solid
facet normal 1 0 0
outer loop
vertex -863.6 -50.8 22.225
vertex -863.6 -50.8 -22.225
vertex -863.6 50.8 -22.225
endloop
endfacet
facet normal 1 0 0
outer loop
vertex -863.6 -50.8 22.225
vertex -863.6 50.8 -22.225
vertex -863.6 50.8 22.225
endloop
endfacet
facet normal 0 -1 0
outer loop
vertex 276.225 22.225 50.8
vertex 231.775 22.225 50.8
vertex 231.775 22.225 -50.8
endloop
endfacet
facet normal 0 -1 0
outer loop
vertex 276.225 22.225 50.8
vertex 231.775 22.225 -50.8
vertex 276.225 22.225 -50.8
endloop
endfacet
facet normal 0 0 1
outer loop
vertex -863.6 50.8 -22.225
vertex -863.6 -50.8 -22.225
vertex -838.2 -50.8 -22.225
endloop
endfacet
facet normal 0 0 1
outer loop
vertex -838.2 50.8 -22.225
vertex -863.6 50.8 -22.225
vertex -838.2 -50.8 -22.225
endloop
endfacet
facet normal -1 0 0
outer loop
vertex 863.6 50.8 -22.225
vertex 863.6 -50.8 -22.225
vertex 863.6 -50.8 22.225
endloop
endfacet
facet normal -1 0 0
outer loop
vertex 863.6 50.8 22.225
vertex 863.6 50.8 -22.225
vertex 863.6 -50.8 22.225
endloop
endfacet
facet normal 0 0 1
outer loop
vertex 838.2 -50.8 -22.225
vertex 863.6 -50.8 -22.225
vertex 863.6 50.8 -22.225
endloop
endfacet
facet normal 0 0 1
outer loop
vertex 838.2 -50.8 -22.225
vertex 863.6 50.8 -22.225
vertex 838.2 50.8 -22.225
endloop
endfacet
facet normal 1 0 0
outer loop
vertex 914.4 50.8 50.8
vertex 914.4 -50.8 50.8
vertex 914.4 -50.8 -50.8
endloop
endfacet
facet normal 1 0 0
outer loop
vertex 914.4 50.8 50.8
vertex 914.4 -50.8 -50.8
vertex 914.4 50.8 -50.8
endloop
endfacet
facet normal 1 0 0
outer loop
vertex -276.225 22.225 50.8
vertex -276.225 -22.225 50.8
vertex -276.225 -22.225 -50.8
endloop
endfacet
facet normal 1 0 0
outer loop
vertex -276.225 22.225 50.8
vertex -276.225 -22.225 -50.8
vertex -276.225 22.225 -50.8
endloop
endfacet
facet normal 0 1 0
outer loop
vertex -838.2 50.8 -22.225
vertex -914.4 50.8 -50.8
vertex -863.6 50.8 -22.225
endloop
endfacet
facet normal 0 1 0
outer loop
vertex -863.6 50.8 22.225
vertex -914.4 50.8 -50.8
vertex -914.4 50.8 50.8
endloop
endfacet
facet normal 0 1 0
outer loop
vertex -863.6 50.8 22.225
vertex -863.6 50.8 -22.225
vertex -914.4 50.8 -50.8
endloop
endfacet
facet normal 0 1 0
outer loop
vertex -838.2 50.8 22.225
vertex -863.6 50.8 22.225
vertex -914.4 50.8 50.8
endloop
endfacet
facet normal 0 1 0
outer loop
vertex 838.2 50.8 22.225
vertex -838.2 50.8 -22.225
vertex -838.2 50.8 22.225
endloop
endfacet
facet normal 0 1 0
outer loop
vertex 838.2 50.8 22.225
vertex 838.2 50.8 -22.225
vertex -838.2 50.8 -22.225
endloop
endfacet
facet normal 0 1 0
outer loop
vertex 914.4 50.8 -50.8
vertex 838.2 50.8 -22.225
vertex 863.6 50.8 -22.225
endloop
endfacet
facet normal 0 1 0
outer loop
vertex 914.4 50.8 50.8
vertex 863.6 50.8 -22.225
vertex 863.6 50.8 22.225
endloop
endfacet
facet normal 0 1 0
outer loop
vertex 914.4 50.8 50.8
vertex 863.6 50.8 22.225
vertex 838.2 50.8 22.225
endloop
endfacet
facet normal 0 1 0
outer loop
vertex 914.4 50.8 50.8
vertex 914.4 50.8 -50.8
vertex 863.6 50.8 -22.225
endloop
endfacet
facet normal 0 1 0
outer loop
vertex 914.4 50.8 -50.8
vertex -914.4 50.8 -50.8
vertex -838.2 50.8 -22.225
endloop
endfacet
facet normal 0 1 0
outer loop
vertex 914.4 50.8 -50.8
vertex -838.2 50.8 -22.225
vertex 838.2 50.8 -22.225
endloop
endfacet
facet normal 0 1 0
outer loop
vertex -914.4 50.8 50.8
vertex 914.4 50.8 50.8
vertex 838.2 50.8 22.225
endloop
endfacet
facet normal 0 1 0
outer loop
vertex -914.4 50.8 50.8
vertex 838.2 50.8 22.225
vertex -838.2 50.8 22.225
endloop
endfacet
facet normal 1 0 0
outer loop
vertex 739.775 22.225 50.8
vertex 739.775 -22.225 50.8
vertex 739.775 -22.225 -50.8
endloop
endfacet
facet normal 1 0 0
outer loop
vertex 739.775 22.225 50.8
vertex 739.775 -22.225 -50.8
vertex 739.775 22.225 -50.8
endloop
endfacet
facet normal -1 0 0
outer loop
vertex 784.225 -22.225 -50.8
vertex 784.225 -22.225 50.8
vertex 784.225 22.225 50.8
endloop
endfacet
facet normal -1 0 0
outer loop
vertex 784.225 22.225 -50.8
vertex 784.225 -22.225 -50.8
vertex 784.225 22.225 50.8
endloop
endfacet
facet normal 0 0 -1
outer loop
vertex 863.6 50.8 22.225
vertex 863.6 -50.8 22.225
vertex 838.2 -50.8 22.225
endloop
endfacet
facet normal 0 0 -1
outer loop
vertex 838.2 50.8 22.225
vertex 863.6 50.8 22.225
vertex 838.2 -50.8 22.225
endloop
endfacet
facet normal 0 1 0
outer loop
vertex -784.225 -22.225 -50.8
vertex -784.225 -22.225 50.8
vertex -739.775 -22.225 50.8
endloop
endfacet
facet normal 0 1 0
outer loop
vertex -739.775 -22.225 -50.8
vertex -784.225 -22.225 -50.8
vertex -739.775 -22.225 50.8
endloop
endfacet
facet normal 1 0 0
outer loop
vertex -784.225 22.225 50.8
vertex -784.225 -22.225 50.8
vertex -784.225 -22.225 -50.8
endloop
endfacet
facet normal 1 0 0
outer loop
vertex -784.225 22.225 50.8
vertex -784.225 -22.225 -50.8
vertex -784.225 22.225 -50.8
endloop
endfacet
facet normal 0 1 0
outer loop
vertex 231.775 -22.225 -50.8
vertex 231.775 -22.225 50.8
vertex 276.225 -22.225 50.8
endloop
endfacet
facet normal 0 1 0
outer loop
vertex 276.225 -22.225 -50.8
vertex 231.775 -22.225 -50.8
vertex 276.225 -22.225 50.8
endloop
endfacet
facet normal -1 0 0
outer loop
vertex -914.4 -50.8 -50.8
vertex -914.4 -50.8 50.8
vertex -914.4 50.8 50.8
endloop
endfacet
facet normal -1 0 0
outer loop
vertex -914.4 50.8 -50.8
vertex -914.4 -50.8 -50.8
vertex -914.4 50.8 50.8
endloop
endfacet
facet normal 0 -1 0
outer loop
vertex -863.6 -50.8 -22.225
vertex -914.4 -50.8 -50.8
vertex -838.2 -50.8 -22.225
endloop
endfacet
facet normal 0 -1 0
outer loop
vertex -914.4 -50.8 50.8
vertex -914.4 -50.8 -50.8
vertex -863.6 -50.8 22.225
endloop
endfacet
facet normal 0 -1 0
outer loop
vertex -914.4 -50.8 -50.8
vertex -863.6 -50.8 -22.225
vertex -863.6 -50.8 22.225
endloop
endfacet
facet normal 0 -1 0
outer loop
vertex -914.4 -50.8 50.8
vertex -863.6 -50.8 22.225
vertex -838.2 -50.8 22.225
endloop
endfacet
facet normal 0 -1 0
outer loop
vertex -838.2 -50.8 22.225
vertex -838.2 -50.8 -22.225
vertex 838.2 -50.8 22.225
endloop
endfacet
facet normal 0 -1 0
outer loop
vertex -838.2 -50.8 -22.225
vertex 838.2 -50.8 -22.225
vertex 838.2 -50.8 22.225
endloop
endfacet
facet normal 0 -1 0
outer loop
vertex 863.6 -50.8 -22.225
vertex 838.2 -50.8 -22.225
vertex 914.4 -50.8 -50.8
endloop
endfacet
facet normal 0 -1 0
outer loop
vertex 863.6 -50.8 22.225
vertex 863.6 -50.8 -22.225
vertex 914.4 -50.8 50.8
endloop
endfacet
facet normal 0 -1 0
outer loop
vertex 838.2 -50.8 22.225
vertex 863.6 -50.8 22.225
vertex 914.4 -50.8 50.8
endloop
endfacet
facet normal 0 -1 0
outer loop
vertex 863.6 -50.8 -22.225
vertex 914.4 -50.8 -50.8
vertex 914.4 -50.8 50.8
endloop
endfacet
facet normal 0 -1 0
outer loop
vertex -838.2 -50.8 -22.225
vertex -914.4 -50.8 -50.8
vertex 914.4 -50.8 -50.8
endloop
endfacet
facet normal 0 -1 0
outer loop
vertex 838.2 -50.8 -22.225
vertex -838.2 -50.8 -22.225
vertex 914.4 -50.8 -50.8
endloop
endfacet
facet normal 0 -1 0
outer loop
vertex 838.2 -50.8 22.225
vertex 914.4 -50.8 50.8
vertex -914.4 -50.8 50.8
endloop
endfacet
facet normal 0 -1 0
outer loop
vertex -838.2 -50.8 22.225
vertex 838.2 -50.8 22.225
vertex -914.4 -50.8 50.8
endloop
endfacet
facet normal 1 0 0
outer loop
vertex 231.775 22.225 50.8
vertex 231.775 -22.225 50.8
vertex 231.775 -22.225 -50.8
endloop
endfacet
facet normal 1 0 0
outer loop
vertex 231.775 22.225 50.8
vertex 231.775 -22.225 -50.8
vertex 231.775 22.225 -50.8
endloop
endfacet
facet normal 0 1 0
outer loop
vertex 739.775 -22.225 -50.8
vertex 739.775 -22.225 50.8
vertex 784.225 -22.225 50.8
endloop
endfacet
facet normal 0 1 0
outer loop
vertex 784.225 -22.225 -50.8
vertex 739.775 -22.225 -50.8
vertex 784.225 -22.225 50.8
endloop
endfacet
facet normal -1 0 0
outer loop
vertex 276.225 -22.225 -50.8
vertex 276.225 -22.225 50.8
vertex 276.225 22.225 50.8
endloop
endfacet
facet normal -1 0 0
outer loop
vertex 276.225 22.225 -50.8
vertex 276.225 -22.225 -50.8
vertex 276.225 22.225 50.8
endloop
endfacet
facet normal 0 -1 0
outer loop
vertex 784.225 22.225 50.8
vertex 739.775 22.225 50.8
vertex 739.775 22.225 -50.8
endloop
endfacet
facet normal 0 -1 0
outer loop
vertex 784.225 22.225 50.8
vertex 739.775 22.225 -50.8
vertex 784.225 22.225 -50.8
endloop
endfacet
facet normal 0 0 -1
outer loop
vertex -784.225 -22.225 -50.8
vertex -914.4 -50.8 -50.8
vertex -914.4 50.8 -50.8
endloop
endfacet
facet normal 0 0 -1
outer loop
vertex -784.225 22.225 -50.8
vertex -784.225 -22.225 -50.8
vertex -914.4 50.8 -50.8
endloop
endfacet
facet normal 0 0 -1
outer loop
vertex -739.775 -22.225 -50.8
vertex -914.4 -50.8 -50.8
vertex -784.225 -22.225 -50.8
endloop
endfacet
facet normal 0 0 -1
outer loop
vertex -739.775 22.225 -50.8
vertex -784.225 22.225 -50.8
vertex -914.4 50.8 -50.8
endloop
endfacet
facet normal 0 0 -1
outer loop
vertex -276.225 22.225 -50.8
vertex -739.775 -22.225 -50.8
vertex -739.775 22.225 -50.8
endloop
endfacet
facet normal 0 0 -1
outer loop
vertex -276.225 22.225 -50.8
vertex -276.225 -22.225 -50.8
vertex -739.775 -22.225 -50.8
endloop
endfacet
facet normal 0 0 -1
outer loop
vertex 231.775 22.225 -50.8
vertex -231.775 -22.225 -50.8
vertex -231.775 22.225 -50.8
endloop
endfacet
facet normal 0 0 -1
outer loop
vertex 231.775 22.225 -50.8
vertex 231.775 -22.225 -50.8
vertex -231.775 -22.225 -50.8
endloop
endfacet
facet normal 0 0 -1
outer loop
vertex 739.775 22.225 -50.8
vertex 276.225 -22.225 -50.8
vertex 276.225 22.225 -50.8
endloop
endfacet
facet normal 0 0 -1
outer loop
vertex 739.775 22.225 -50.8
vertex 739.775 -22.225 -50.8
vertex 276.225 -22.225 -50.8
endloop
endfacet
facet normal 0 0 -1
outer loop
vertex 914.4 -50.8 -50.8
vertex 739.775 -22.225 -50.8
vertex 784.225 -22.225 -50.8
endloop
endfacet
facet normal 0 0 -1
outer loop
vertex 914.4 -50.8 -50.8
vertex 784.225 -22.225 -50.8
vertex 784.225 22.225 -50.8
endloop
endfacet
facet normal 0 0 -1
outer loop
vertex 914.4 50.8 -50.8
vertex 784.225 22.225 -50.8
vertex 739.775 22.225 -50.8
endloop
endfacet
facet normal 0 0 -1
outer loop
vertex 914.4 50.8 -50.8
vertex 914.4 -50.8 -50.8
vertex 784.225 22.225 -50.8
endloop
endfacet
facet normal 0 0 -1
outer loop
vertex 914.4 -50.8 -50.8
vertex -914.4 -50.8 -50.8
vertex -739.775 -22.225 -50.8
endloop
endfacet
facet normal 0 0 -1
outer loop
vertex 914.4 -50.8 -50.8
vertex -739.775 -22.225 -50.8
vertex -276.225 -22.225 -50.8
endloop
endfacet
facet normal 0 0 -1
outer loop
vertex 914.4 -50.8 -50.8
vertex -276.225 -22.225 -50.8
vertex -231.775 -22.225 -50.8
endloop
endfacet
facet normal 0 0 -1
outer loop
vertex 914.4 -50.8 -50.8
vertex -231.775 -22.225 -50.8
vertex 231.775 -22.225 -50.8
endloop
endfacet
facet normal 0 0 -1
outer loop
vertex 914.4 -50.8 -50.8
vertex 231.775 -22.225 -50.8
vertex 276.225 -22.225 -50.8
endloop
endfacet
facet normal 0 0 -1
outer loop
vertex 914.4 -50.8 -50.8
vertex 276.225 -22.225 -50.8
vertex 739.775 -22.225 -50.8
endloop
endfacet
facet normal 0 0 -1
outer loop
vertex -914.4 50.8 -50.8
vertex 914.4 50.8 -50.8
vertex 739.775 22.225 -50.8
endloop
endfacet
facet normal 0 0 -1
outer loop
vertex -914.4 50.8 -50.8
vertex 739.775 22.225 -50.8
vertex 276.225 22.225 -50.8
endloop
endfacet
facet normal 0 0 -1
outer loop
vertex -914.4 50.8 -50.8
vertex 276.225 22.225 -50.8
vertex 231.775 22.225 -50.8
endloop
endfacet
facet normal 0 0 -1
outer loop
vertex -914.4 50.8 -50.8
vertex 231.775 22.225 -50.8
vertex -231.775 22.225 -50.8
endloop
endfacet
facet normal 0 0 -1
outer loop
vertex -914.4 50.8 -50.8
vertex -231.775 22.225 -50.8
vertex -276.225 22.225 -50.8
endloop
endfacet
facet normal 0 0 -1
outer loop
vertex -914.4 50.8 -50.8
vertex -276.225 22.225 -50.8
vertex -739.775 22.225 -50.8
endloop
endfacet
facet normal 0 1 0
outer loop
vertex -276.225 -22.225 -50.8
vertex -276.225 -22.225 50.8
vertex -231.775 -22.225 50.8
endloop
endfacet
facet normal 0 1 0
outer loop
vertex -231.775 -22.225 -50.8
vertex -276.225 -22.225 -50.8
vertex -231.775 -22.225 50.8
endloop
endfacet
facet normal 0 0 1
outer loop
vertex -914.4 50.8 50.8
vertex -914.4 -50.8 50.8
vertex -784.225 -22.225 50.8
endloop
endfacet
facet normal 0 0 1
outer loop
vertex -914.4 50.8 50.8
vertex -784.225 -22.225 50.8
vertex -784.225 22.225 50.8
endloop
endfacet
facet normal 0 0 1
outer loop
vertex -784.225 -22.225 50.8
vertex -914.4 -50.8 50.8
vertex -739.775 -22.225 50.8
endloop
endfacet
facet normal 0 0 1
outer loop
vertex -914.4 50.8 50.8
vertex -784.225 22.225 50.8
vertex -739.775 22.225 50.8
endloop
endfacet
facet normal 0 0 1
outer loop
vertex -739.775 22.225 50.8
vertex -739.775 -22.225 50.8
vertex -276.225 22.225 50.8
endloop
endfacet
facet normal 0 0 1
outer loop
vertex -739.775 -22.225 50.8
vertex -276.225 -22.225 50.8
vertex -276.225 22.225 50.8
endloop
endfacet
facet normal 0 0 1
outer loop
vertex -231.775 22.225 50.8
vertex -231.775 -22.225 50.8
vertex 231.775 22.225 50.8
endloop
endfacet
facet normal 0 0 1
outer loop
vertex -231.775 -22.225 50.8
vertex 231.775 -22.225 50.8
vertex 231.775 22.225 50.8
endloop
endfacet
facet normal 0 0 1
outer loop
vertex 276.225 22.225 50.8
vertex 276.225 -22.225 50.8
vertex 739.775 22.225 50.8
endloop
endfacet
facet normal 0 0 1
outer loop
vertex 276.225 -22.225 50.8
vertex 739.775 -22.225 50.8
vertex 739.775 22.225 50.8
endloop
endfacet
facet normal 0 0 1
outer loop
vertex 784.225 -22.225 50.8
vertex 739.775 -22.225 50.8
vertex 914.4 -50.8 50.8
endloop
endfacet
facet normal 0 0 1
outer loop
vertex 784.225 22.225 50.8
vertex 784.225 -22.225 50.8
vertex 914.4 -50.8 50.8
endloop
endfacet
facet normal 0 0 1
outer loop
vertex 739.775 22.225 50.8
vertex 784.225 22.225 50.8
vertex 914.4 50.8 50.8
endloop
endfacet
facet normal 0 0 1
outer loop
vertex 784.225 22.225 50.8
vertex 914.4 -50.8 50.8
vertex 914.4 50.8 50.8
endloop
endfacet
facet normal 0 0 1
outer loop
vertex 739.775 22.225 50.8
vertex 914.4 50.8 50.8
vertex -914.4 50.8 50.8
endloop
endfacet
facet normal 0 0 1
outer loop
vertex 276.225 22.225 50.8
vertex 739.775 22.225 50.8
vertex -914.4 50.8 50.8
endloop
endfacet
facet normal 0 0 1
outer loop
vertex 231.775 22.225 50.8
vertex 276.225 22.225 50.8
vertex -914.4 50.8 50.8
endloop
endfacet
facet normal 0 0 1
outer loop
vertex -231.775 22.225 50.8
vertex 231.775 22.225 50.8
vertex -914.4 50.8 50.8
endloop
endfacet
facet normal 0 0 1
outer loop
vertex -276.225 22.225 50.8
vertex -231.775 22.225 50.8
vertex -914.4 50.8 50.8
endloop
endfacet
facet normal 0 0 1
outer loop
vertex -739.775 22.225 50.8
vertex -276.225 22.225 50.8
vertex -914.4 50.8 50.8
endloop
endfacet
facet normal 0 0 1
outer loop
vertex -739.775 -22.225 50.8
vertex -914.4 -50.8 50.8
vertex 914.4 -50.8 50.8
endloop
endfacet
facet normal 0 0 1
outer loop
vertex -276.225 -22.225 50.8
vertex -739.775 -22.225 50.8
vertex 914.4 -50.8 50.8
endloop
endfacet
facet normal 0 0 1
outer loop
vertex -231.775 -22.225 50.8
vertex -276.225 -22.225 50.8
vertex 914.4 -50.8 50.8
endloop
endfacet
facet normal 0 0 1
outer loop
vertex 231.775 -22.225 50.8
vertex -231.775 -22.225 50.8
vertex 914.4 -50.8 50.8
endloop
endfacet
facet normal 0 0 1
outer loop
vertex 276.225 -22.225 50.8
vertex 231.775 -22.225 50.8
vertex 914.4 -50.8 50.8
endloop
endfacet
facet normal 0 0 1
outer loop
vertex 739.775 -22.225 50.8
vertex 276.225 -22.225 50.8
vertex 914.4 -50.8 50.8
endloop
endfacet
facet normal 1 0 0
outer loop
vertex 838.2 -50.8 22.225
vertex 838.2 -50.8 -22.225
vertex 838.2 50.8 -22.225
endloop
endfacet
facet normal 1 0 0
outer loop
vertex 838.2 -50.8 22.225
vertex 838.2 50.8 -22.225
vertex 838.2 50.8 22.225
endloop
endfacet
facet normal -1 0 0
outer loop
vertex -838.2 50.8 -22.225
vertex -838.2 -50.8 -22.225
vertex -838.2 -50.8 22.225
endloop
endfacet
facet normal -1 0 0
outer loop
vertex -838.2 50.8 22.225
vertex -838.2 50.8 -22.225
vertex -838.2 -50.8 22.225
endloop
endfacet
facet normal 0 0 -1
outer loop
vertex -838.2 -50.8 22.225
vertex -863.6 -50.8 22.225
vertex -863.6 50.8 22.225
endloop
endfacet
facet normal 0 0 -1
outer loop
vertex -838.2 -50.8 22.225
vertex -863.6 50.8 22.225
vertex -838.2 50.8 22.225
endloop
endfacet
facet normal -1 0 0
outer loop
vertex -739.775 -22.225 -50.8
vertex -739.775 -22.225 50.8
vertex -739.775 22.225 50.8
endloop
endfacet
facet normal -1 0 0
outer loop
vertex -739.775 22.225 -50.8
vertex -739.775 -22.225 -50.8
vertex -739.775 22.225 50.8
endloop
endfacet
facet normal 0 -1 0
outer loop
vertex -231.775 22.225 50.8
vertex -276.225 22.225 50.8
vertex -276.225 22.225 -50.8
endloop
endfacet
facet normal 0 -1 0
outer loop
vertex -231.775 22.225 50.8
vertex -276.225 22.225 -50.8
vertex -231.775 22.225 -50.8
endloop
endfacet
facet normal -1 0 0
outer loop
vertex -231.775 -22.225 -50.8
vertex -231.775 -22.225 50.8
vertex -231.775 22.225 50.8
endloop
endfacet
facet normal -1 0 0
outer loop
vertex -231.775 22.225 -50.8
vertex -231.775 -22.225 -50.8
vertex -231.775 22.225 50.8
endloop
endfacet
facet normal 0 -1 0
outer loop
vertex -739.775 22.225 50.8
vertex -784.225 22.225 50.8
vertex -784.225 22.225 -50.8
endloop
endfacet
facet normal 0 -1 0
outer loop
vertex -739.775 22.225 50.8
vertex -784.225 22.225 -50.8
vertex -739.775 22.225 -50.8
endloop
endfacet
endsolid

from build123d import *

# Parameters (mm, degrees)
F0_W            = 101.6
F0_H            = 101.6
F1_DEPTH        = 914.4
F2_W            = 44.45
F2_H            = 44.45
F3_DEPTH        = 101.601
F4_W            = 44.45
F4_H            = 44.45
F5_DEPTH        = 101.601
F5_COPIES_COUNT = 3
F5_COPIES_PITCH = 508
F6_W            = 25.4
F6_H            = 44.45
F7_DEPTH        = 101.601


# Not quite as in the source:
# - a pattern or mirror of a feature is missing from the dataset's text; its kind, count and spacing are read off the source's solid


with BuildPart() as f1:
    # F0 (on Right) → F1 (new body, symmetric)
    with BuildSketch(Plane.YZ):
        Rectangle(F0_W, F0_H)
    extrude(amount=F1_DEPTH, both=True)

    # F2 (on face) → F3 (cut, through all)
    with BuildSketch(Plane.XY.offset(50.8)):
        with Locations((-762, 0)):
            Rectangle(F2_W, F2_H)
    extrude(amount=-F3_DEPTH, mode=Mode.SUBTRACT)

    # F4 (on face) → F5 (cut, through all)
    with BuildSketch(Plane.XY.offset(50.8)):
        with Locations((-254, 0)):
            Rectangle(F4_W, F4_H)
    f5 = extrude(amount=-F5_DEPTH, mode=Mode.SUBTRACT)

    # F5_copies: F5 ×3
    with Locations(*[(i * F5_COPIES_PITCH, 0, 0) for i in range(1, F5_COPIES_COUNT)]):
        add(f5, mode=Mode.SUBTRACT)

    # F6 (on face) → F7 (cut, through all)
    with BuildSketch(Plane.XZ.offset(50.8)):
        with Locations((-850.9, 0)):
            Rectangle(F6_W, F6_H)
    f7 = extrude(amount=-F7_DEPTH, mode=Mode.SUBTRACT)

    # F7_copies: F7 across plane
    add(f7.mirror(Plane(origin=(0, 0, 0), x_dir=(0, 0, 1), z_dir=(1, 0, 0))), mode=Mode.SUBTRACT)


solid = f1.part
